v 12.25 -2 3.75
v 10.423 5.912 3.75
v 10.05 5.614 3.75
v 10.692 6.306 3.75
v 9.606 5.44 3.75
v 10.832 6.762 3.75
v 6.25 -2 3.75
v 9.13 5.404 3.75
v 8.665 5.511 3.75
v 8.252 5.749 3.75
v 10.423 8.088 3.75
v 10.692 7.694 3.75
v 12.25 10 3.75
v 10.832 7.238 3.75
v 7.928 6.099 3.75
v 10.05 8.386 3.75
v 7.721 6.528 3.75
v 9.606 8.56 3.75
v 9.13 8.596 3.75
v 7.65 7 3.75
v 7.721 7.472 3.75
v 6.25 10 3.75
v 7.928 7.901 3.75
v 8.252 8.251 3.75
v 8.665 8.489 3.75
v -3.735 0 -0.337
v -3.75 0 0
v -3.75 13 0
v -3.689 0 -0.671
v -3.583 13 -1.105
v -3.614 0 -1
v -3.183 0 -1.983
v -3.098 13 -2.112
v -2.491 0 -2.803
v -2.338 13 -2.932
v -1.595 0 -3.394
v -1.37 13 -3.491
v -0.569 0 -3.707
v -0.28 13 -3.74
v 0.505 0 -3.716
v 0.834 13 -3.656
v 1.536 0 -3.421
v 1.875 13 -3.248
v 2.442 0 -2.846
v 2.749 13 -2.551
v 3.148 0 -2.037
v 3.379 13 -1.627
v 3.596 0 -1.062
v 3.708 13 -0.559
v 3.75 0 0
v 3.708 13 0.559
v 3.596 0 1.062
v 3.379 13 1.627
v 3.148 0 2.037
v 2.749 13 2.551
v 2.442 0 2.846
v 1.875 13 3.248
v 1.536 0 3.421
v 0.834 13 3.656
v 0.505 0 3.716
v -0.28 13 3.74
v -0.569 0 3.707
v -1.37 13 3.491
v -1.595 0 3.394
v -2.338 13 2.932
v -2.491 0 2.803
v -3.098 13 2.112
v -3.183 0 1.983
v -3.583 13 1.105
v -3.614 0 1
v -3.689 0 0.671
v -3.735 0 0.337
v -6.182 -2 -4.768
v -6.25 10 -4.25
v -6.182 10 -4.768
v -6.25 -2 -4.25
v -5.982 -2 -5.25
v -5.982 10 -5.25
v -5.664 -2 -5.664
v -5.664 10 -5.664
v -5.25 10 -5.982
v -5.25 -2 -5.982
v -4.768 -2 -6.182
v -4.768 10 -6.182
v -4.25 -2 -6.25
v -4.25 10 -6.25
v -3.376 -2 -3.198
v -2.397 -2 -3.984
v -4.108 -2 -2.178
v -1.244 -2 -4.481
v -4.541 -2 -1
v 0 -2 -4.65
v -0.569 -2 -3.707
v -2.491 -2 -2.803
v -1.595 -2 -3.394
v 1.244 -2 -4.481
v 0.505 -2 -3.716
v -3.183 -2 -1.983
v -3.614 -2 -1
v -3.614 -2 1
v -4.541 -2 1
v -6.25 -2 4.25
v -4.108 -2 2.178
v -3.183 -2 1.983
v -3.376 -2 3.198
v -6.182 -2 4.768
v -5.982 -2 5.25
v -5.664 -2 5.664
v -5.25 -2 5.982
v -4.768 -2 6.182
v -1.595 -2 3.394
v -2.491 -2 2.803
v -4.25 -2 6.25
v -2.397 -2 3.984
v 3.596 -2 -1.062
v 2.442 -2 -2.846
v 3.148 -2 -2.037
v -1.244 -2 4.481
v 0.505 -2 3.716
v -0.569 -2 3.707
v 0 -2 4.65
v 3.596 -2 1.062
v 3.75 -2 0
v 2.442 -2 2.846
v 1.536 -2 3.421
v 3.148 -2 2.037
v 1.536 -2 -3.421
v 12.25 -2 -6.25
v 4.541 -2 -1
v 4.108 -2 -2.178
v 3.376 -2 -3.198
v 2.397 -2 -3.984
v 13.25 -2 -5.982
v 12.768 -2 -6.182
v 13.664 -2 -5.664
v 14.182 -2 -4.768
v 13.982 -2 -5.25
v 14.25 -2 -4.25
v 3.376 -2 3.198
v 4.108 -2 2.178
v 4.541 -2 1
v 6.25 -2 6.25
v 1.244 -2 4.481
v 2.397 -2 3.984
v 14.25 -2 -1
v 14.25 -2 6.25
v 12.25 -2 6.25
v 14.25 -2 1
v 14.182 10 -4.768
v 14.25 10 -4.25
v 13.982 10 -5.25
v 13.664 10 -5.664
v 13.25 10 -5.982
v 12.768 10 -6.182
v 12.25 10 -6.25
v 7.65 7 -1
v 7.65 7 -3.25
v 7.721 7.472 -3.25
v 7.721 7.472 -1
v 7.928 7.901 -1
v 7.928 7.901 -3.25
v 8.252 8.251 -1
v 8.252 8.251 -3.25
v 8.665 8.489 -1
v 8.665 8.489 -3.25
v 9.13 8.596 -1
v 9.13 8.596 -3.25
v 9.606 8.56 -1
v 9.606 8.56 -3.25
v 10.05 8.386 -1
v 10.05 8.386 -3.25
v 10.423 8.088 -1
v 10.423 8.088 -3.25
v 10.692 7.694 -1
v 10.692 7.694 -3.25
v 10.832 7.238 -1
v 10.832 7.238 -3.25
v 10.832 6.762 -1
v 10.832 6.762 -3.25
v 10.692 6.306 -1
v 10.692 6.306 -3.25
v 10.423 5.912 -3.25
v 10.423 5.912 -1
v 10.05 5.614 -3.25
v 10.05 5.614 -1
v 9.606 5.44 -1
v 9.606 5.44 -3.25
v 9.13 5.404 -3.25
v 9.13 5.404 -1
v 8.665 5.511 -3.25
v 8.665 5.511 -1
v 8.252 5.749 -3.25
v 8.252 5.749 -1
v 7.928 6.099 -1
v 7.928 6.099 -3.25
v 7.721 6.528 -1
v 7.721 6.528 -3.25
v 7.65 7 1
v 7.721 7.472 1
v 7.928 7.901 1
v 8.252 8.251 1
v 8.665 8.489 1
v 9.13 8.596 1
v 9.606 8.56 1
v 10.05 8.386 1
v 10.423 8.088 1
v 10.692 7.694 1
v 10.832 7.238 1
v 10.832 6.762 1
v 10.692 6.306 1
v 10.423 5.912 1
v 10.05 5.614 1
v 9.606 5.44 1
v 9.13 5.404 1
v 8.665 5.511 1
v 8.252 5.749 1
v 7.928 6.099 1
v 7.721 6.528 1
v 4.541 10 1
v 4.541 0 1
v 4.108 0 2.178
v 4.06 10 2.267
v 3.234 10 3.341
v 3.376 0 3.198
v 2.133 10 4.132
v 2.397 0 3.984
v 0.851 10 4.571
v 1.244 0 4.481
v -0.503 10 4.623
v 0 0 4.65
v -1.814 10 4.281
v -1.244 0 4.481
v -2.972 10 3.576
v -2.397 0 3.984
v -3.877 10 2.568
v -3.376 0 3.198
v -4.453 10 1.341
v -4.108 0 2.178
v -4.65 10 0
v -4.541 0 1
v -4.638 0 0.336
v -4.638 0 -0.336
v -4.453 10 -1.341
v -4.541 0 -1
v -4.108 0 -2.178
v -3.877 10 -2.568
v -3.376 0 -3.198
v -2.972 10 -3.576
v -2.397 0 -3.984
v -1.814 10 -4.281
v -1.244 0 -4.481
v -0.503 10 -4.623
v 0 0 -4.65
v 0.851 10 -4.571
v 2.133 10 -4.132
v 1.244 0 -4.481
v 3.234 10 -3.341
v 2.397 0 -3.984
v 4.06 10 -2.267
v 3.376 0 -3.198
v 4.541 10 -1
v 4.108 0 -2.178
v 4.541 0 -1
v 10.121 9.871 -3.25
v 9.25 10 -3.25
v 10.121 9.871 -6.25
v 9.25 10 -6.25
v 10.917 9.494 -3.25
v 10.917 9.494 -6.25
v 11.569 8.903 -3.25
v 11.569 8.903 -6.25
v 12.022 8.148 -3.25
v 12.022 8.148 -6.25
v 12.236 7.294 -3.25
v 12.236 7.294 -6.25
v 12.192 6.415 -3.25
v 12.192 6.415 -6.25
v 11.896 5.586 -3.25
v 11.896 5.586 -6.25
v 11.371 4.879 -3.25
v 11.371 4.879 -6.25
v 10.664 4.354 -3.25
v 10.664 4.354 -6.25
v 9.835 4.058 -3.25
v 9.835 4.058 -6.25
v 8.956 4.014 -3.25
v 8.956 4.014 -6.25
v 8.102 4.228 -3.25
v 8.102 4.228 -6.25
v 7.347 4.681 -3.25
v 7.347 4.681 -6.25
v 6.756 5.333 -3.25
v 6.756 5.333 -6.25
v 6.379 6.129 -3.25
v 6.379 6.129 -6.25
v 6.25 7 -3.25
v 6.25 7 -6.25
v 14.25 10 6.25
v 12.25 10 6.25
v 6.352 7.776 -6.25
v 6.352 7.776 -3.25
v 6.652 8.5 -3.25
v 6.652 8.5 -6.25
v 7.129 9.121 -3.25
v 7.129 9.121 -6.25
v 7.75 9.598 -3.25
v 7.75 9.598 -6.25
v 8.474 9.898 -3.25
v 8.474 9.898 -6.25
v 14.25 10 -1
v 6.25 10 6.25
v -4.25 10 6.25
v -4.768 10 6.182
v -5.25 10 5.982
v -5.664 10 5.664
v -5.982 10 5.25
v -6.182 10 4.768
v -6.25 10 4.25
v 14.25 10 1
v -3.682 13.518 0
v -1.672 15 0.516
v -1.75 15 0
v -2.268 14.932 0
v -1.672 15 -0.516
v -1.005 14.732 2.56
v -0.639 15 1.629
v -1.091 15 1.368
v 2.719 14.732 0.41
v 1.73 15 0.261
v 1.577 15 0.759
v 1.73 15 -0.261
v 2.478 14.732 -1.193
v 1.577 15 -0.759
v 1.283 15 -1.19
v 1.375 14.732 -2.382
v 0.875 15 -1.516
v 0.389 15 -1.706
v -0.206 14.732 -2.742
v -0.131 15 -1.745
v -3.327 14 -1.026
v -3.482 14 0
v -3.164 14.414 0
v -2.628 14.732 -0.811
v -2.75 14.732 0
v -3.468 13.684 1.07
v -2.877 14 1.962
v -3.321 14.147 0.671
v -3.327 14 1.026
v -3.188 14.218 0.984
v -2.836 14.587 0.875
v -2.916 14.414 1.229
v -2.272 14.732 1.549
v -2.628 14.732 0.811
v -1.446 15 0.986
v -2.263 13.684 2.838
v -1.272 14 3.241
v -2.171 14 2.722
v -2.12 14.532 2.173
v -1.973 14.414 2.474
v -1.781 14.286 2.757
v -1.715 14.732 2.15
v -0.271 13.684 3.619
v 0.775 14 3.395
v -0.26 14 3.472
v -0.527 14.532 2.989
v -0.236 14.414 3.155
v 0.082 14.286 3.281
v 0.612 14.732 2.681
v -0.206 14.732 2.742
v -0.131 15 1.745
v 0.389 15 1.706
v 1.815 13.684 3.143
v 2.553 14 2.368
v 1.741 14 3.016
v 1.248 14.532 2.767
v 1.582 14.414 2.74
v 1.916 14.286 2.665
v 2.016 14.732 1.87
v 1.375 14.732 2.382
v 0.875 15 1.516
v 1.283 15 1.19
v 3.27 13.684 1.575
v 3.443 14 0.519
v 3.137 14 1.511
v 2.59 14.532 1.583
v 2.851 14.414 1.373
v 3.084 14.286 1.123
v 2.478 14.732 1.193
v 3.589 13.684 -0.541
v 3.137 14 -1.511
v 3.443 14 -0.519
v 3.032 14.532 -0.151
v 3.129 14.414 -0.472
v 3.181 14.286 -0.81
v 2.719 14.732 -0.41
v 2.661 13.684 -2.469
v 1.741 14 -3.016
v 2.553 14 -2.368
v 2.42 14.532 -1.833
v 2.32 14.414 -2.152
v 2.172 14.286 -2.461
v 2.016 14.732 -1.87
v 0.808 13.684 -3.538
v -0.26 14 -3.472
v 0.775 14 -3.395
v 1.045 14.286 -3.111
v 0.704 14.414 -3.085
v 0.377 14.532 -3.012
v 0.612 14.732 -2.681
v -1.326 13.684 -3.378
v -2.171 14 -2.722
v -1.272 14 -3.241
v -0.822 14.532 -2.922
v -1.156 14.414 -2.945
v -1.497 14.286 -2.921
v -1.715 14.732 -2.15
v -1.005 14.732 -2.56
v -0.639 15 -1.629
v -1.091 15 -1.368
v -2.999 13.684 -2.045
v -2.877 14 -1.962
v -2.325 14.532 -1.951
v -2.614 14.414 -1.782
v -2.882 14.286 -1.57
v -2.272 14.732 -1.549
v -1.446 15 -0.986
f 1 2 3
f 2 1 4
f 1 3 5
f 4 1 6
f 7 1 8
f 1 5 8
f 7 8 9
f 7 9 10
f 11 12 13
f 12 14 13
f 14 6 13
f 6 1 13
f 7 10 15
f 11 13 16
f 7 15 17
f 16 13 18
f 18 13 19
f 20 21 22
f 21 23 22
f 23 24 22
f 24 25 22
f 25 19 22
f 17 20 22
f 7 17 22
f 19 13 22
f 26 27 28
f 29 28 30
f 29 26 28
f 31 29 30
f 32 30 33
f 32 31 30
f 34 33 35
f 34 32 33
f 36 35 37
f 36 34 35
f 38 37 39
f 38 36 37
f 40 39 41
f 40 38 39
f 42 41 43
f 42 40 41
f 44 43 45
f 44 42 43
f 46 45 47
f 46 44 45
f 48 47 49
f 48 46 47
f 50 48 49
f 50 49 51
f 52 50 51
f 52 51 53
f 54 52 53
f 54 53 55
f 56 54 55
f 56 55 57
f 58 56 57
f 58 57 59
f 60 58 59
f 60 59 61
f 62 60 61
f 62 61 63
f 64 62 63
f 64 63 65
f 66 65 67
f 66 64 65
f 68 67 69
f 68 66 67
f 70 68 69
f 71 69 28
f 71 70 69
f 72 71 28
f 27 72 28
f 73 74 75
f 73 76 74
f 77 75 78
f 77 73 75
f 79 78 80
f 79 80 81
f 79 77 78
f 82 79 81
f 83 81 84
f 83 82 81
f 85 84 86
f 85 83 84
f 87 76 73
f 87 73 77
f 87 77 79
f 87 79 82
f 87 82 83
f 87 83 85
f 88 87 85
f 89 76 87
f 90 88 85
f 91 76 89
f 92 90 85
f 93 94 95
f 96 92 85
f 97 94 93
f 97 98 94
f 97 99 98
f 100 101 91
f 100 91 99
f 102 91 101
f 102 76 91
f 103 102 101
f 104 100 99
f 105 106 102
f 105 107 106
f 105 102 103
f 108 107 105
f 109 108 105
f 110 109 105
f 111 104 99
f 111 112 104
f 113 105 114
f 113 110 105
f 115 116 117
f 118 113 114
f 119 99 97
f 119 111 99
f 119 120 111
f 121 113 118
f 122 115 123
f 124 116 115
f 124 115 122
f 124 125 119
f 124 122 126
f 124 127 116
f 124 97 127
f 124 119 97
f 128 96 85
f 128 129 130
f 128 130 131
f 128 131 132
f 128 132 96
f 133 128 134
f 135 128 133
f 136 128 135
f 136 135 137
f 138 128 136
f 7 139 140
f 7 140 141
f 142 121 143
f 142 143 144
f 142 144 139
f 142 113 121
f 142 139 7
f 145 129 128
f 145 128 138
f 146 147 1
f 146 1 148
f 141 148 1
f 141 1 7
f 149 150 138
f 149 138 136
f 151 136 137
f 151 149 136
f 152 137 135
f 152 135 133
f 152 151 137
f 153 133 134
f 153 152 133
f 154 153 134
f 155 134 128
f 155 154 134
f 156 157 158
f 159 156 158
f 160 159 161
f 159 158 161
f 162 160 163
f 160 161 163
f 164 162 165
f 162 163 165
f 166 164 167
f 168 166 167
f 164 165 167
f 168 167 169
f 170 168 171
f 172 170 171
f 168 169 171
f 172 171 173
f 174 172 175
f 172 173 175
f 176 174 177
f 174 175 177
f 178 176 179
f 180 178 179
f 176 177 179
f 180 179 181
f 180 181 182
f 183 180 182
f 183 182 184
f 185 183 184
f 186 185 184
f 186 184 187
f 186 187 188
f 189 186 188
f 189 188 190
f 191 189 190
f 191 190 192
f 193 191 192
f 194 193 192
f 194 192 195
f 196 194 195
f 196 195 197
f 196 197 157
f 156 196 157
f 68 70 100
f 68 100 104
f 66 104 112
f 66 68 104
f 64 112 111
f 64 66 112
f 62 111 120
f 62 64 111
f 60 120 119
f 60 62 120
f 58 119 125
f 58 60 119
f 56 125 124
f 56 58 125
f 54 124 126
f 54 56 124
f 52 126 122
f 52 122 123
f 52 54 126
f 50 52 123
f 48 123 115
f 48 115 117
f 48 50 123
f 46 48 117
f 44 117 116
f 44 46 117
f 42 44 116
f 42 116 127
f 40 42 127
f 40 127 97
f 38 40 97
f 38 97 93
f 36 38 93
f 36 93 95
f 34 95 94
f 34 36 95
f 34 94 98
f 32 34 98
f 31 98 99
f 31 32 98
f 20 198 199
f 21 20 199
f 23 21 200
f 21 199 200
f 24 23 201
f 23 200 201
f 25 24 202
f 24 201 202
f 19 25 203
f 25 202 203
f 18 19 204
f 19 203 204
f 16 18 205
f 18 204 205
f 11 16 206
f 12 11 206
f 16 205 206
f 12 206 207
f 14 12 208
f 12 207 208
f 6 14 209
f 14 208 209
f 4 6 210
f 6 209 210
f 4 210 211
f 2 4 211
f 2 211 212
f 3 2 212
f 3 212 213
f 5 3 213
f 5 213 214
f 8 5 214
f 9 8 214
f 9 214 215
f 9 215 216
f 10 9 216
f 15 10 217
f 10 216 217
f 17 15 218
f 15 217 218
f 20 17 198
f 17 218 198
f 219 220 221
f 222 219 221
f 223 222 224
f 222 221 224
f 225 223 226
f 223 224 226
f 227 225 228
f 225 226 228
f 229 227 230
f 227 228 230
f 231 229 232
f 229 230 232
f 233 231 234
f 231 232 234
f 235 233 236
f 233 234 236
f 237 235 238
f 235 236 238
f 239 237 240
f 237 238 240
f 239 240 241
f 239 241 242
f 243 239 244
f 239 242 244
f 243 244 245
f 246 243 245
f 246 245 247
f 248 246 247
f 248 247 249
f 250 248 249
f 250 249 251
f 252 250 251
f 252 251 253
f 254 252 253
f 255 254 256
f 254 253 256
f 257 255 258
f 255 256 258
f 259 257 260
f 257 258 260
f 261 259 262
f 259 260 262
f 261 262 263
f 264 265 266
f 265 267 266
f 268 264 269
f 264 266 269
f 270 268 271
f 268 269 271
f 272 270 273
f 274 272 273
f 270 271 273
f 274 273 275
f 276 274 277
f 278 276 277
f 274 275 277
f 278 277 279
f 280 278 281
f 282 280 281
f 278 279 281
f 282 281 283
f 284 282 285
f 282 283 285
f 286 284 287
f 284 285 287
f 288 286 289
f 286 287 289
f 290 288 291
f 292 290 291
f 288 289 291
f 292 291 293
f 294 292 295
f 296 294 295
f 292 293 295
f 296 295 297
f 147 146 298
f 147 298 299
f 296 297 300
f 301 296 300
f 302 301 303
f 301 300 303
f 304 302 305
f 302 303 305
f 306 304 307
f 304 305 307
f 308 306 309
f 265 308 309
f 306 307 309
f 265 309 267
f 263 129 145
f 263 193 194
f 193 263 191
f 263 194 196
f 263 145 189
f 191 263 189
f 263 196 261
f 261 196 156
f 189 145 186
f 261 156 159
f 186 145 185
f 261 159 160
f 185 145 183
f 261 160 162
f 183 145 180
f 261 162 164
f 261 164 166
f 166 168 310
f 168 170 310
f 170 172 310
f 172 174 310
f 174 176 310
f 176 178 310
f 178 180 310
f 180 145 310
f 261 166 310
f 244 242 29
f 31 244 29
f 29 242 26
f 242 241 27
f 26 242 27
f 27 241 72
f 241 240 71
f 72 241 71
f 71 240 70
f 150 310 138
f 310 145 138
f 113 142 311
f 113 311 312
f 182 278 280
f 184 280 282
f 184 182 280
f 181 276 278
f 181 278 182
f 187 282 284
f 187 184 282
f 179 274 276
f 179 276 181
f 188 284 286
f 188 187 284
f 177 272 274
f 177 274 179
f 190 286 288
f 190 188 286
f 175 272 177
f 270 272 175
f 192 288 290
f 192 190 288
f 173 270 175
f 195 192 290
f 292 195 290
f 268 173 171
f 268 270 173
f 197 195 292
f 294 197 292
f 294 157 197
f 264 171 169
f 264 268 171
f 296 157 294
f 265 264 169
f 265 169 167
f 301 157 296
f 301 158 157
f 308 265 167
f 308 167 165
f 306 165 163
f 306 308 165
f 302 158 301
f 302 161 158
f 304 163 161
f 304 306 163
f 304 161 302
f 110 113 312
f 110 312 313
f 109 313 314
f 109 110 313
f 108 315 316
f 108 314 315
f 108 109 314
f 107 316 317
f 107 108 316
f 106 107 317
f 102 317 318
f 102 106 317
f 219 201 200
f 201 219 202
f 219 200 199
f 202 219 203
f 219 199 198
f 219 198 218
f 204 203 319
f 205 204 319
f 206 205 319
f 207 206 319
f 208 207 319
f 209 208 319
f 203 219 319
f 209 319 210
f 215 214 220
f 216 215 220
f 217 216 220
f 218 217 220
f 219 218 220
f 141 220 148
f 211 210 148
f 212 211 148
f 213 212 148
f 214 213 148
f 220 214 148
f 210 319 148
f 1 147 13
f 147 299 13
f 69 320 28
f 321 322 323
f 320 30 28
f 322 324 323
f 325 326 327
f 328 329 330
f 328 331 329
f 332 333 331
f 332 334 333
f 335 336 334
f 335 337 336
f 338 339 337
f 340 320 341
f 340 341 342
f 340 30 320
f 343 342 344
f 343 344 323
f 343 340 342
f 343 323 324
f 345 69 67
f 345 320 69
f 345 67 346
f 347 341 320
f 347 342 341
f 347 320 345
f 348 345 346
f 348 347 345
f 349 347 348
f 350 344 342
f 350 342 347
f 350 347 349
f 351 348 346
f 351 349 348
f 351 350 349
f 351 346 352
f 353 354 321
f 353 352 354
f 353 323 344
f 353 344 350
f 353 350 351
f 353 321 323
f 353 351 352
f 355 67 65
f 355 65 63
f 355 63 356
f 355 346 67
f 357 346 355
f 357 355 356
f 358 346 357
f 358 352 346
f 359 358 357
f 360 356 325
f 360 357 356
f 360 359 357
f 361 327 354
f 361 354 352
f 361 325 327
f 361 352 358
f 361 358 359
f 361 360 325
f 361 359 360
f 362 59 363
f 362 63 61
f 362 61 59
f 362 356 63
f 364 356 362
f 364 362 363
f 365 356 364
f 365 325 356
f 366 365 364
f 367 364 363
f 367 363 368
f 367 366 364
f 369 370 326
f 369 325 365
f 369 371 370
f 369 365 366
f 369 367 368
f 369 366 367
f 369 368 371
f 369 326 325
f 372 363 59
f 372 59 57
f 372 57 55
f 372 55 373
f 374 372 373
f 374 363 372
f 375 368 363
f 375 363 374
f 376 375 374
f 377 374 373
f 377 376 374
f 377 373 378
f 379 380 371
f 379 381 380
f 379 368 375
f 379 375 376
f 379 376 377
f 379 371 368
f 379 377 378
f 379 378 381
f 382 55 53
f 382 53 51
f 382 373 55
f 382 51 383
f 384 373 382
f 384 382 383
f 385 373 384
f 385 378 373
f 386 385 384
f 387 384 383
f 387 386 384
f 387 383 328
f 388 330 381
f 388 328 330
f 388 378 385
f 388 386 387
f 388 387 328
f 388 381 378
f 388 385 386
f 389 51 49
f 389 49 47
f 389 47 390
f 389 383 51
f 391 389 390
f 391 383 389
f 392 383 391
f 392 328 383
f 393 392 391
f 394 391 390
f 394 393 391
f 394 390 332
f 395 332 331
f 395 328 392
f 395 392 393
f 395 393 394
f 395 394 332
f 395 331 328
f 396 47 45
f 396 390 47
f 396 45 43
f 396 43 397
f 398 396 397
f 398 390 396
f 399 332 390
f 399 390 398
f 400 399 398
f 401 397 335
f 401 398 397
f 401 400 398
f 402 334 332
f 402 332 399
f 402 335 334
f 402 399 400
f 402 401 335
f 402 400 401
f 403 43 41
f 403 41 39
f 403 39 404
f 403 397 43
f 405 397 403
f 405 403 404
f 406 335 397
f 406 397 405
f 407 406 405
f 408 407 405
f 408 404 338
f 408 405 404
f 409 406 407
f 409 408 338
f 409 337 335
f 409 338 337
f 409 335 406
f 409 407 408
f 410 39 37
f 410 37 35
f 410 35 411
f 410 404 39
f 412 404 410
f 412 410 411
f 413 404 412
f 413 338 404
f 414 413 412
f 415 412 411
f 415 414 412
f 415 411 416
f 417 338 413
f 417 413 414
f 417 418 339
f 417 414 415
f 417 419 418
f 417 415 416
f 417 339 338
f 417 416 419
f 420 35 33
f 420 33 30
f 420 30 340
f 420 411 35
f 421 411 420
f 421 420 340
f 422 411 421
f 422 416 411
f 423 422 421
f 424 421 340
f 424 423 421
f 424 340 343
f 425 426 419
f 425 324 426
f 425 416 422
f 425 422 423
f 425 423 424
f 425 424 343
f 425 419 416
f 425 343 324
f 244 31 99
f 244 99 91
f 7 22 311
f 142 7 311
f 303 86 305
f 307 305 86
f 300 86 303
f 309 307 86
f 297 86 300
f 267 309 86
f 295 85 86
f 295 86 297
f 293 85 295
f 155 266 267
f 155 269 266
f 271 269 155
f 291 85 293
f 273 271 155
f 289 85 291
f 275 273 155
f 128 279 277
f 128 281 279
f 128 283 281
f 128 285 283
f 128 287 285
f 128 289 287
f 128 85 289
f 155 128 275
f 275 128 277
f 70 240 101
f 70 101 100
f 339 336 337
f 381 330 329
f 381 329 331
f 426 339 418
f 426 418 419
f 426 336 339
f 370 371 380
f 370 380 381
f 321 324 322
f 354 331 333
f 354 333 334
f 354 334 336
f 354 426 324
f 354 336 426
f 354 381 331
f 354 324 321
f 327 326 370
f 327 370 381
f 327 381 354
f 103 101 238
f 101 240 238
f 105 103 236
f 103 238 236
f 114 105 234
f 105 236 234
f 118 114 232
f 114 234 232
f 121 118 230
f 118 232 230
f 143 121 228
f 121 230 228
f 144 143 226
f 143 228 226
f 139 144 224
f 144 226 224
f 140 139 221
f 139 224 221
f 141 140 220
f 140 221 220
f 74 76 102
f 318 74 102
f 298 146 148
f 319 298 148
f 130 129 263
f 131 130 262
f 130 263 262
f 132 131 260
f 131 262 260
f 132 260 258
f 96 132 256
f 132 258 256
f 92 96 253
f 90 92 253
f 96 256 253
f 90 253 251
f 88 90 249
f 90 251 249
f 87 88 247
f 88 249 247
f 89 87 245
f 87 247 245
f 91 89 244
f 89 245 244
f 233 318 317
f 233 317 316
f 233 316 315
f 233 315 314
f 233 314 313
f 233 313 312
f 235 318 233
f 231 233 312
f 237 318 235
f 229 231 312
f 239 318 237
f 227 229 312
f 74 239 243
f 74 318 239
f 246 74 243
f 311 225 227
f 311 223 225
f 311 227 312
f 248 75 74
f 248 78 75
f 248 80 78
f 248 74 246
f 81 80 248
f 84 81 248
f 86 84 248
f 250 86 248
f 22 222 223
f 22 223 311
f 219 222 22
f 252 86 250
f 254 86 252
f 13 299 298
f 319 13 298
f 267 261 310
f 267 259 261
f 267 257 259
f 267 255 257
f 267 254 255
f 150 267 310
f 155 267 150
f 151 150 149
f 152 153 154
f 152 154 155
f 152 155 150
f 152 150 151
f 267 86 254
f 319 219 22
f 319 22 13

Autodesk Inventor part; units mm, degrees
ref_plane "YZ Plane" through (0, 0, 0) normal (1, 0, 0) x (0, 1, 0)
ref_plane "XZ Plane" through (0, 0, 0) normal (0, 1, 0) x (-1, 0, 0)
ref_plane "XY Plane" through (0, 0, 0) normal (0, 0, 1) x (1, 0, 0)
sketch "Sketch1" plane through (0, 0, 0) normal (0, 1, 0) x (-1, 0, 0)
  circle A0 centre (0, 0) radius 3.75
  dimension "d0" = 7.5
extrude "Extrusion1" add sketch "Sketch1" along normal blind 15
fillet "Fillet1" radius 2 1 edges at (3.75, 15, 0)
sketch "Sketch2" plane through (0, 0, 0) normal (0, -1, 0) x (1, 0, 0)
  line L0 (14.25, 6.25) -> (-6.25, 6.25)
  line L1 (-6.25, 6.25) -> (-6.25, -6.25)
  line L2 (-6.25, -6.25) -> (14.25, -6.25)
  line L3 (14.25, -6.25) -> (14.25, 6.25)
  point P0 (0, 0)
  dimension "d4" = 12.5
  dimension "d5" = 20.5
  dimension "d6" = 6.25
  dimension "d7" = 6.25
extrude "Extrusion2" add sketch "Sketch2" along normal blind 2
sketch "Sketch3" plane through (0, 0, 0) normal (0, 1, 0) x (1, 0, 0)
  line L0 (14.25, -6.25) -> (-6.25, -6.25) projected
  line L1 (-6.25, 6.25) -> (14.25, 6.25) projected
  line L2 (-6.25, -6.25) -> (14.25, -6.25)
  line L3 (14.25, -6.25) -> (14.25, 6.25)
  line L4 (14.25, 6.25) -> (-6.25, 6.25)
  line L5 (-6.25, 6.25) -> (-6.25, -6.25)
  circle A0 centre (0, 0) radius 4.65
  point P0 (-6.25, 6.25)
  dimension "d10" = 9.3
extrude "Extrusion3" add sketch "Sketch3" along normal blind 10
sketch "Sketch4" plane through (14.25, -2, 6.25) normal (1, 0, 0) x (0, 0, -1)
  line L0 (5.25, 0) -> (7.25, 0)
  line L1 (7.25, 0) -> (7.25, 12)
  line L2 (7.25, 12) -> (5.25, 12)
  line L3 (5.25, 12) -> (5.25, 0)
  line L4 (12.5, 0) -> (0, 0) projected
  line L5 (0, 12) -> (12.5, 12) projected
  line L6 (0, 12) -> (0, 0) projected
  point P0 (6.25, 2)
  dimension "d14" = 2
  dimension "d15" = 5.25
extrude "Extrusion4" cut sketch "Sketch4" against normal blind 9.71 contours L3 L2 L1 L0
sketch "Sketch6" plane through (0, 10, 0) normal (0, 1, 0) x (1, 0, 0)
  line L0 (6.25, -6.25) -> (12.25, -6.25)
  line L1 (12.25, -6.25) -> (12.25, -3.75)
  line L2 (12.25, -3.75) -> (6.25, -3.75)
  line L3 (6.25, -3.75) -> (6.25, -6.25)
  line L4 (14.25, -6.25) -> (14.25, -1) projected
  line L5 (-6.25, -6.25) -> (14.25, -6.25) projected
  point P0 (0, 0)
  dimension "d18" = 6
  dimension "d19" = 2.5
  dimension "d20" = 2
extrude "Extrusion5" cut sketch "Sketch6" against normal through all
sketch "Sketch7" plane through (14.25, -2, -6.25) normal (0, 0, -1) x (-1, 0, 0)
  circle A0 centre (5, 9) radius 1.6
  line L0 (0, 12) -> (20.5, 12) projected
  line L1 (0, 12) -> (0, 0) projected
  point P0 (14.25, 2)
  dimension "d23" = 3.2
  dimension "d24" = 3
  dimension "d25" = 5
extrude "Extrusion6" cut sketch "Sketch7" against normal through all
sketch "Sketch8" plane through (14.25, -2, -6.25) normal (0, 0, -1) x (-1, 0, 0)
  circle A0 centre (5, 9) radius 3
  line L0 (0, 12) -> (20.5, 12) projected
  line L1 (0, 12) -> (0, 0) projected
  point P0 (14.25, 2)
  dimension "d28" = 6
  dimension "d29" = 3
  dimension "d30" = 5
extrude "Extrusion7" cut sketch "Sketch8" against normal blind 3
fillet "Fillet2" radius 2 3 edges at (-6.25, 4, -6.25) (14.25, 4, -6.25) (-6.25, 4, 6.25)
sketch "Sketch9" plane through (0, 0, 0) normal (0, 1, 0) x (1, 0, 0)
  arc A0 (-4.5412, -1) -> (-4.5412, 1) centre (0, 0) ccw
  arc A1 (-3.6142, -1) -> (-3.6142, 1) centre (0, 0) ccw
  line L0 (14.25, -1) -> (4.5412, -1) projected
  line L1 (4.5412, 1) -> (14.25, 1) projected
  line L2 (-4.5412, -1) -> (-3.6142, -1)
  line L3 (-3.6142, 1) -> (-4.5412, 1)
  dimension "d34" = 3.75
  dimension "d35" = 4.65
  dimension "d36" = 2
  dimension "d37" = 2
  dimension "d38" = 2
  dimension "d39" = 2
extrude "Extrusion8" cut sketch "Sketch9" against normal through all
equation "\"d7\" = d6"
properties part number "BOUCHON"
